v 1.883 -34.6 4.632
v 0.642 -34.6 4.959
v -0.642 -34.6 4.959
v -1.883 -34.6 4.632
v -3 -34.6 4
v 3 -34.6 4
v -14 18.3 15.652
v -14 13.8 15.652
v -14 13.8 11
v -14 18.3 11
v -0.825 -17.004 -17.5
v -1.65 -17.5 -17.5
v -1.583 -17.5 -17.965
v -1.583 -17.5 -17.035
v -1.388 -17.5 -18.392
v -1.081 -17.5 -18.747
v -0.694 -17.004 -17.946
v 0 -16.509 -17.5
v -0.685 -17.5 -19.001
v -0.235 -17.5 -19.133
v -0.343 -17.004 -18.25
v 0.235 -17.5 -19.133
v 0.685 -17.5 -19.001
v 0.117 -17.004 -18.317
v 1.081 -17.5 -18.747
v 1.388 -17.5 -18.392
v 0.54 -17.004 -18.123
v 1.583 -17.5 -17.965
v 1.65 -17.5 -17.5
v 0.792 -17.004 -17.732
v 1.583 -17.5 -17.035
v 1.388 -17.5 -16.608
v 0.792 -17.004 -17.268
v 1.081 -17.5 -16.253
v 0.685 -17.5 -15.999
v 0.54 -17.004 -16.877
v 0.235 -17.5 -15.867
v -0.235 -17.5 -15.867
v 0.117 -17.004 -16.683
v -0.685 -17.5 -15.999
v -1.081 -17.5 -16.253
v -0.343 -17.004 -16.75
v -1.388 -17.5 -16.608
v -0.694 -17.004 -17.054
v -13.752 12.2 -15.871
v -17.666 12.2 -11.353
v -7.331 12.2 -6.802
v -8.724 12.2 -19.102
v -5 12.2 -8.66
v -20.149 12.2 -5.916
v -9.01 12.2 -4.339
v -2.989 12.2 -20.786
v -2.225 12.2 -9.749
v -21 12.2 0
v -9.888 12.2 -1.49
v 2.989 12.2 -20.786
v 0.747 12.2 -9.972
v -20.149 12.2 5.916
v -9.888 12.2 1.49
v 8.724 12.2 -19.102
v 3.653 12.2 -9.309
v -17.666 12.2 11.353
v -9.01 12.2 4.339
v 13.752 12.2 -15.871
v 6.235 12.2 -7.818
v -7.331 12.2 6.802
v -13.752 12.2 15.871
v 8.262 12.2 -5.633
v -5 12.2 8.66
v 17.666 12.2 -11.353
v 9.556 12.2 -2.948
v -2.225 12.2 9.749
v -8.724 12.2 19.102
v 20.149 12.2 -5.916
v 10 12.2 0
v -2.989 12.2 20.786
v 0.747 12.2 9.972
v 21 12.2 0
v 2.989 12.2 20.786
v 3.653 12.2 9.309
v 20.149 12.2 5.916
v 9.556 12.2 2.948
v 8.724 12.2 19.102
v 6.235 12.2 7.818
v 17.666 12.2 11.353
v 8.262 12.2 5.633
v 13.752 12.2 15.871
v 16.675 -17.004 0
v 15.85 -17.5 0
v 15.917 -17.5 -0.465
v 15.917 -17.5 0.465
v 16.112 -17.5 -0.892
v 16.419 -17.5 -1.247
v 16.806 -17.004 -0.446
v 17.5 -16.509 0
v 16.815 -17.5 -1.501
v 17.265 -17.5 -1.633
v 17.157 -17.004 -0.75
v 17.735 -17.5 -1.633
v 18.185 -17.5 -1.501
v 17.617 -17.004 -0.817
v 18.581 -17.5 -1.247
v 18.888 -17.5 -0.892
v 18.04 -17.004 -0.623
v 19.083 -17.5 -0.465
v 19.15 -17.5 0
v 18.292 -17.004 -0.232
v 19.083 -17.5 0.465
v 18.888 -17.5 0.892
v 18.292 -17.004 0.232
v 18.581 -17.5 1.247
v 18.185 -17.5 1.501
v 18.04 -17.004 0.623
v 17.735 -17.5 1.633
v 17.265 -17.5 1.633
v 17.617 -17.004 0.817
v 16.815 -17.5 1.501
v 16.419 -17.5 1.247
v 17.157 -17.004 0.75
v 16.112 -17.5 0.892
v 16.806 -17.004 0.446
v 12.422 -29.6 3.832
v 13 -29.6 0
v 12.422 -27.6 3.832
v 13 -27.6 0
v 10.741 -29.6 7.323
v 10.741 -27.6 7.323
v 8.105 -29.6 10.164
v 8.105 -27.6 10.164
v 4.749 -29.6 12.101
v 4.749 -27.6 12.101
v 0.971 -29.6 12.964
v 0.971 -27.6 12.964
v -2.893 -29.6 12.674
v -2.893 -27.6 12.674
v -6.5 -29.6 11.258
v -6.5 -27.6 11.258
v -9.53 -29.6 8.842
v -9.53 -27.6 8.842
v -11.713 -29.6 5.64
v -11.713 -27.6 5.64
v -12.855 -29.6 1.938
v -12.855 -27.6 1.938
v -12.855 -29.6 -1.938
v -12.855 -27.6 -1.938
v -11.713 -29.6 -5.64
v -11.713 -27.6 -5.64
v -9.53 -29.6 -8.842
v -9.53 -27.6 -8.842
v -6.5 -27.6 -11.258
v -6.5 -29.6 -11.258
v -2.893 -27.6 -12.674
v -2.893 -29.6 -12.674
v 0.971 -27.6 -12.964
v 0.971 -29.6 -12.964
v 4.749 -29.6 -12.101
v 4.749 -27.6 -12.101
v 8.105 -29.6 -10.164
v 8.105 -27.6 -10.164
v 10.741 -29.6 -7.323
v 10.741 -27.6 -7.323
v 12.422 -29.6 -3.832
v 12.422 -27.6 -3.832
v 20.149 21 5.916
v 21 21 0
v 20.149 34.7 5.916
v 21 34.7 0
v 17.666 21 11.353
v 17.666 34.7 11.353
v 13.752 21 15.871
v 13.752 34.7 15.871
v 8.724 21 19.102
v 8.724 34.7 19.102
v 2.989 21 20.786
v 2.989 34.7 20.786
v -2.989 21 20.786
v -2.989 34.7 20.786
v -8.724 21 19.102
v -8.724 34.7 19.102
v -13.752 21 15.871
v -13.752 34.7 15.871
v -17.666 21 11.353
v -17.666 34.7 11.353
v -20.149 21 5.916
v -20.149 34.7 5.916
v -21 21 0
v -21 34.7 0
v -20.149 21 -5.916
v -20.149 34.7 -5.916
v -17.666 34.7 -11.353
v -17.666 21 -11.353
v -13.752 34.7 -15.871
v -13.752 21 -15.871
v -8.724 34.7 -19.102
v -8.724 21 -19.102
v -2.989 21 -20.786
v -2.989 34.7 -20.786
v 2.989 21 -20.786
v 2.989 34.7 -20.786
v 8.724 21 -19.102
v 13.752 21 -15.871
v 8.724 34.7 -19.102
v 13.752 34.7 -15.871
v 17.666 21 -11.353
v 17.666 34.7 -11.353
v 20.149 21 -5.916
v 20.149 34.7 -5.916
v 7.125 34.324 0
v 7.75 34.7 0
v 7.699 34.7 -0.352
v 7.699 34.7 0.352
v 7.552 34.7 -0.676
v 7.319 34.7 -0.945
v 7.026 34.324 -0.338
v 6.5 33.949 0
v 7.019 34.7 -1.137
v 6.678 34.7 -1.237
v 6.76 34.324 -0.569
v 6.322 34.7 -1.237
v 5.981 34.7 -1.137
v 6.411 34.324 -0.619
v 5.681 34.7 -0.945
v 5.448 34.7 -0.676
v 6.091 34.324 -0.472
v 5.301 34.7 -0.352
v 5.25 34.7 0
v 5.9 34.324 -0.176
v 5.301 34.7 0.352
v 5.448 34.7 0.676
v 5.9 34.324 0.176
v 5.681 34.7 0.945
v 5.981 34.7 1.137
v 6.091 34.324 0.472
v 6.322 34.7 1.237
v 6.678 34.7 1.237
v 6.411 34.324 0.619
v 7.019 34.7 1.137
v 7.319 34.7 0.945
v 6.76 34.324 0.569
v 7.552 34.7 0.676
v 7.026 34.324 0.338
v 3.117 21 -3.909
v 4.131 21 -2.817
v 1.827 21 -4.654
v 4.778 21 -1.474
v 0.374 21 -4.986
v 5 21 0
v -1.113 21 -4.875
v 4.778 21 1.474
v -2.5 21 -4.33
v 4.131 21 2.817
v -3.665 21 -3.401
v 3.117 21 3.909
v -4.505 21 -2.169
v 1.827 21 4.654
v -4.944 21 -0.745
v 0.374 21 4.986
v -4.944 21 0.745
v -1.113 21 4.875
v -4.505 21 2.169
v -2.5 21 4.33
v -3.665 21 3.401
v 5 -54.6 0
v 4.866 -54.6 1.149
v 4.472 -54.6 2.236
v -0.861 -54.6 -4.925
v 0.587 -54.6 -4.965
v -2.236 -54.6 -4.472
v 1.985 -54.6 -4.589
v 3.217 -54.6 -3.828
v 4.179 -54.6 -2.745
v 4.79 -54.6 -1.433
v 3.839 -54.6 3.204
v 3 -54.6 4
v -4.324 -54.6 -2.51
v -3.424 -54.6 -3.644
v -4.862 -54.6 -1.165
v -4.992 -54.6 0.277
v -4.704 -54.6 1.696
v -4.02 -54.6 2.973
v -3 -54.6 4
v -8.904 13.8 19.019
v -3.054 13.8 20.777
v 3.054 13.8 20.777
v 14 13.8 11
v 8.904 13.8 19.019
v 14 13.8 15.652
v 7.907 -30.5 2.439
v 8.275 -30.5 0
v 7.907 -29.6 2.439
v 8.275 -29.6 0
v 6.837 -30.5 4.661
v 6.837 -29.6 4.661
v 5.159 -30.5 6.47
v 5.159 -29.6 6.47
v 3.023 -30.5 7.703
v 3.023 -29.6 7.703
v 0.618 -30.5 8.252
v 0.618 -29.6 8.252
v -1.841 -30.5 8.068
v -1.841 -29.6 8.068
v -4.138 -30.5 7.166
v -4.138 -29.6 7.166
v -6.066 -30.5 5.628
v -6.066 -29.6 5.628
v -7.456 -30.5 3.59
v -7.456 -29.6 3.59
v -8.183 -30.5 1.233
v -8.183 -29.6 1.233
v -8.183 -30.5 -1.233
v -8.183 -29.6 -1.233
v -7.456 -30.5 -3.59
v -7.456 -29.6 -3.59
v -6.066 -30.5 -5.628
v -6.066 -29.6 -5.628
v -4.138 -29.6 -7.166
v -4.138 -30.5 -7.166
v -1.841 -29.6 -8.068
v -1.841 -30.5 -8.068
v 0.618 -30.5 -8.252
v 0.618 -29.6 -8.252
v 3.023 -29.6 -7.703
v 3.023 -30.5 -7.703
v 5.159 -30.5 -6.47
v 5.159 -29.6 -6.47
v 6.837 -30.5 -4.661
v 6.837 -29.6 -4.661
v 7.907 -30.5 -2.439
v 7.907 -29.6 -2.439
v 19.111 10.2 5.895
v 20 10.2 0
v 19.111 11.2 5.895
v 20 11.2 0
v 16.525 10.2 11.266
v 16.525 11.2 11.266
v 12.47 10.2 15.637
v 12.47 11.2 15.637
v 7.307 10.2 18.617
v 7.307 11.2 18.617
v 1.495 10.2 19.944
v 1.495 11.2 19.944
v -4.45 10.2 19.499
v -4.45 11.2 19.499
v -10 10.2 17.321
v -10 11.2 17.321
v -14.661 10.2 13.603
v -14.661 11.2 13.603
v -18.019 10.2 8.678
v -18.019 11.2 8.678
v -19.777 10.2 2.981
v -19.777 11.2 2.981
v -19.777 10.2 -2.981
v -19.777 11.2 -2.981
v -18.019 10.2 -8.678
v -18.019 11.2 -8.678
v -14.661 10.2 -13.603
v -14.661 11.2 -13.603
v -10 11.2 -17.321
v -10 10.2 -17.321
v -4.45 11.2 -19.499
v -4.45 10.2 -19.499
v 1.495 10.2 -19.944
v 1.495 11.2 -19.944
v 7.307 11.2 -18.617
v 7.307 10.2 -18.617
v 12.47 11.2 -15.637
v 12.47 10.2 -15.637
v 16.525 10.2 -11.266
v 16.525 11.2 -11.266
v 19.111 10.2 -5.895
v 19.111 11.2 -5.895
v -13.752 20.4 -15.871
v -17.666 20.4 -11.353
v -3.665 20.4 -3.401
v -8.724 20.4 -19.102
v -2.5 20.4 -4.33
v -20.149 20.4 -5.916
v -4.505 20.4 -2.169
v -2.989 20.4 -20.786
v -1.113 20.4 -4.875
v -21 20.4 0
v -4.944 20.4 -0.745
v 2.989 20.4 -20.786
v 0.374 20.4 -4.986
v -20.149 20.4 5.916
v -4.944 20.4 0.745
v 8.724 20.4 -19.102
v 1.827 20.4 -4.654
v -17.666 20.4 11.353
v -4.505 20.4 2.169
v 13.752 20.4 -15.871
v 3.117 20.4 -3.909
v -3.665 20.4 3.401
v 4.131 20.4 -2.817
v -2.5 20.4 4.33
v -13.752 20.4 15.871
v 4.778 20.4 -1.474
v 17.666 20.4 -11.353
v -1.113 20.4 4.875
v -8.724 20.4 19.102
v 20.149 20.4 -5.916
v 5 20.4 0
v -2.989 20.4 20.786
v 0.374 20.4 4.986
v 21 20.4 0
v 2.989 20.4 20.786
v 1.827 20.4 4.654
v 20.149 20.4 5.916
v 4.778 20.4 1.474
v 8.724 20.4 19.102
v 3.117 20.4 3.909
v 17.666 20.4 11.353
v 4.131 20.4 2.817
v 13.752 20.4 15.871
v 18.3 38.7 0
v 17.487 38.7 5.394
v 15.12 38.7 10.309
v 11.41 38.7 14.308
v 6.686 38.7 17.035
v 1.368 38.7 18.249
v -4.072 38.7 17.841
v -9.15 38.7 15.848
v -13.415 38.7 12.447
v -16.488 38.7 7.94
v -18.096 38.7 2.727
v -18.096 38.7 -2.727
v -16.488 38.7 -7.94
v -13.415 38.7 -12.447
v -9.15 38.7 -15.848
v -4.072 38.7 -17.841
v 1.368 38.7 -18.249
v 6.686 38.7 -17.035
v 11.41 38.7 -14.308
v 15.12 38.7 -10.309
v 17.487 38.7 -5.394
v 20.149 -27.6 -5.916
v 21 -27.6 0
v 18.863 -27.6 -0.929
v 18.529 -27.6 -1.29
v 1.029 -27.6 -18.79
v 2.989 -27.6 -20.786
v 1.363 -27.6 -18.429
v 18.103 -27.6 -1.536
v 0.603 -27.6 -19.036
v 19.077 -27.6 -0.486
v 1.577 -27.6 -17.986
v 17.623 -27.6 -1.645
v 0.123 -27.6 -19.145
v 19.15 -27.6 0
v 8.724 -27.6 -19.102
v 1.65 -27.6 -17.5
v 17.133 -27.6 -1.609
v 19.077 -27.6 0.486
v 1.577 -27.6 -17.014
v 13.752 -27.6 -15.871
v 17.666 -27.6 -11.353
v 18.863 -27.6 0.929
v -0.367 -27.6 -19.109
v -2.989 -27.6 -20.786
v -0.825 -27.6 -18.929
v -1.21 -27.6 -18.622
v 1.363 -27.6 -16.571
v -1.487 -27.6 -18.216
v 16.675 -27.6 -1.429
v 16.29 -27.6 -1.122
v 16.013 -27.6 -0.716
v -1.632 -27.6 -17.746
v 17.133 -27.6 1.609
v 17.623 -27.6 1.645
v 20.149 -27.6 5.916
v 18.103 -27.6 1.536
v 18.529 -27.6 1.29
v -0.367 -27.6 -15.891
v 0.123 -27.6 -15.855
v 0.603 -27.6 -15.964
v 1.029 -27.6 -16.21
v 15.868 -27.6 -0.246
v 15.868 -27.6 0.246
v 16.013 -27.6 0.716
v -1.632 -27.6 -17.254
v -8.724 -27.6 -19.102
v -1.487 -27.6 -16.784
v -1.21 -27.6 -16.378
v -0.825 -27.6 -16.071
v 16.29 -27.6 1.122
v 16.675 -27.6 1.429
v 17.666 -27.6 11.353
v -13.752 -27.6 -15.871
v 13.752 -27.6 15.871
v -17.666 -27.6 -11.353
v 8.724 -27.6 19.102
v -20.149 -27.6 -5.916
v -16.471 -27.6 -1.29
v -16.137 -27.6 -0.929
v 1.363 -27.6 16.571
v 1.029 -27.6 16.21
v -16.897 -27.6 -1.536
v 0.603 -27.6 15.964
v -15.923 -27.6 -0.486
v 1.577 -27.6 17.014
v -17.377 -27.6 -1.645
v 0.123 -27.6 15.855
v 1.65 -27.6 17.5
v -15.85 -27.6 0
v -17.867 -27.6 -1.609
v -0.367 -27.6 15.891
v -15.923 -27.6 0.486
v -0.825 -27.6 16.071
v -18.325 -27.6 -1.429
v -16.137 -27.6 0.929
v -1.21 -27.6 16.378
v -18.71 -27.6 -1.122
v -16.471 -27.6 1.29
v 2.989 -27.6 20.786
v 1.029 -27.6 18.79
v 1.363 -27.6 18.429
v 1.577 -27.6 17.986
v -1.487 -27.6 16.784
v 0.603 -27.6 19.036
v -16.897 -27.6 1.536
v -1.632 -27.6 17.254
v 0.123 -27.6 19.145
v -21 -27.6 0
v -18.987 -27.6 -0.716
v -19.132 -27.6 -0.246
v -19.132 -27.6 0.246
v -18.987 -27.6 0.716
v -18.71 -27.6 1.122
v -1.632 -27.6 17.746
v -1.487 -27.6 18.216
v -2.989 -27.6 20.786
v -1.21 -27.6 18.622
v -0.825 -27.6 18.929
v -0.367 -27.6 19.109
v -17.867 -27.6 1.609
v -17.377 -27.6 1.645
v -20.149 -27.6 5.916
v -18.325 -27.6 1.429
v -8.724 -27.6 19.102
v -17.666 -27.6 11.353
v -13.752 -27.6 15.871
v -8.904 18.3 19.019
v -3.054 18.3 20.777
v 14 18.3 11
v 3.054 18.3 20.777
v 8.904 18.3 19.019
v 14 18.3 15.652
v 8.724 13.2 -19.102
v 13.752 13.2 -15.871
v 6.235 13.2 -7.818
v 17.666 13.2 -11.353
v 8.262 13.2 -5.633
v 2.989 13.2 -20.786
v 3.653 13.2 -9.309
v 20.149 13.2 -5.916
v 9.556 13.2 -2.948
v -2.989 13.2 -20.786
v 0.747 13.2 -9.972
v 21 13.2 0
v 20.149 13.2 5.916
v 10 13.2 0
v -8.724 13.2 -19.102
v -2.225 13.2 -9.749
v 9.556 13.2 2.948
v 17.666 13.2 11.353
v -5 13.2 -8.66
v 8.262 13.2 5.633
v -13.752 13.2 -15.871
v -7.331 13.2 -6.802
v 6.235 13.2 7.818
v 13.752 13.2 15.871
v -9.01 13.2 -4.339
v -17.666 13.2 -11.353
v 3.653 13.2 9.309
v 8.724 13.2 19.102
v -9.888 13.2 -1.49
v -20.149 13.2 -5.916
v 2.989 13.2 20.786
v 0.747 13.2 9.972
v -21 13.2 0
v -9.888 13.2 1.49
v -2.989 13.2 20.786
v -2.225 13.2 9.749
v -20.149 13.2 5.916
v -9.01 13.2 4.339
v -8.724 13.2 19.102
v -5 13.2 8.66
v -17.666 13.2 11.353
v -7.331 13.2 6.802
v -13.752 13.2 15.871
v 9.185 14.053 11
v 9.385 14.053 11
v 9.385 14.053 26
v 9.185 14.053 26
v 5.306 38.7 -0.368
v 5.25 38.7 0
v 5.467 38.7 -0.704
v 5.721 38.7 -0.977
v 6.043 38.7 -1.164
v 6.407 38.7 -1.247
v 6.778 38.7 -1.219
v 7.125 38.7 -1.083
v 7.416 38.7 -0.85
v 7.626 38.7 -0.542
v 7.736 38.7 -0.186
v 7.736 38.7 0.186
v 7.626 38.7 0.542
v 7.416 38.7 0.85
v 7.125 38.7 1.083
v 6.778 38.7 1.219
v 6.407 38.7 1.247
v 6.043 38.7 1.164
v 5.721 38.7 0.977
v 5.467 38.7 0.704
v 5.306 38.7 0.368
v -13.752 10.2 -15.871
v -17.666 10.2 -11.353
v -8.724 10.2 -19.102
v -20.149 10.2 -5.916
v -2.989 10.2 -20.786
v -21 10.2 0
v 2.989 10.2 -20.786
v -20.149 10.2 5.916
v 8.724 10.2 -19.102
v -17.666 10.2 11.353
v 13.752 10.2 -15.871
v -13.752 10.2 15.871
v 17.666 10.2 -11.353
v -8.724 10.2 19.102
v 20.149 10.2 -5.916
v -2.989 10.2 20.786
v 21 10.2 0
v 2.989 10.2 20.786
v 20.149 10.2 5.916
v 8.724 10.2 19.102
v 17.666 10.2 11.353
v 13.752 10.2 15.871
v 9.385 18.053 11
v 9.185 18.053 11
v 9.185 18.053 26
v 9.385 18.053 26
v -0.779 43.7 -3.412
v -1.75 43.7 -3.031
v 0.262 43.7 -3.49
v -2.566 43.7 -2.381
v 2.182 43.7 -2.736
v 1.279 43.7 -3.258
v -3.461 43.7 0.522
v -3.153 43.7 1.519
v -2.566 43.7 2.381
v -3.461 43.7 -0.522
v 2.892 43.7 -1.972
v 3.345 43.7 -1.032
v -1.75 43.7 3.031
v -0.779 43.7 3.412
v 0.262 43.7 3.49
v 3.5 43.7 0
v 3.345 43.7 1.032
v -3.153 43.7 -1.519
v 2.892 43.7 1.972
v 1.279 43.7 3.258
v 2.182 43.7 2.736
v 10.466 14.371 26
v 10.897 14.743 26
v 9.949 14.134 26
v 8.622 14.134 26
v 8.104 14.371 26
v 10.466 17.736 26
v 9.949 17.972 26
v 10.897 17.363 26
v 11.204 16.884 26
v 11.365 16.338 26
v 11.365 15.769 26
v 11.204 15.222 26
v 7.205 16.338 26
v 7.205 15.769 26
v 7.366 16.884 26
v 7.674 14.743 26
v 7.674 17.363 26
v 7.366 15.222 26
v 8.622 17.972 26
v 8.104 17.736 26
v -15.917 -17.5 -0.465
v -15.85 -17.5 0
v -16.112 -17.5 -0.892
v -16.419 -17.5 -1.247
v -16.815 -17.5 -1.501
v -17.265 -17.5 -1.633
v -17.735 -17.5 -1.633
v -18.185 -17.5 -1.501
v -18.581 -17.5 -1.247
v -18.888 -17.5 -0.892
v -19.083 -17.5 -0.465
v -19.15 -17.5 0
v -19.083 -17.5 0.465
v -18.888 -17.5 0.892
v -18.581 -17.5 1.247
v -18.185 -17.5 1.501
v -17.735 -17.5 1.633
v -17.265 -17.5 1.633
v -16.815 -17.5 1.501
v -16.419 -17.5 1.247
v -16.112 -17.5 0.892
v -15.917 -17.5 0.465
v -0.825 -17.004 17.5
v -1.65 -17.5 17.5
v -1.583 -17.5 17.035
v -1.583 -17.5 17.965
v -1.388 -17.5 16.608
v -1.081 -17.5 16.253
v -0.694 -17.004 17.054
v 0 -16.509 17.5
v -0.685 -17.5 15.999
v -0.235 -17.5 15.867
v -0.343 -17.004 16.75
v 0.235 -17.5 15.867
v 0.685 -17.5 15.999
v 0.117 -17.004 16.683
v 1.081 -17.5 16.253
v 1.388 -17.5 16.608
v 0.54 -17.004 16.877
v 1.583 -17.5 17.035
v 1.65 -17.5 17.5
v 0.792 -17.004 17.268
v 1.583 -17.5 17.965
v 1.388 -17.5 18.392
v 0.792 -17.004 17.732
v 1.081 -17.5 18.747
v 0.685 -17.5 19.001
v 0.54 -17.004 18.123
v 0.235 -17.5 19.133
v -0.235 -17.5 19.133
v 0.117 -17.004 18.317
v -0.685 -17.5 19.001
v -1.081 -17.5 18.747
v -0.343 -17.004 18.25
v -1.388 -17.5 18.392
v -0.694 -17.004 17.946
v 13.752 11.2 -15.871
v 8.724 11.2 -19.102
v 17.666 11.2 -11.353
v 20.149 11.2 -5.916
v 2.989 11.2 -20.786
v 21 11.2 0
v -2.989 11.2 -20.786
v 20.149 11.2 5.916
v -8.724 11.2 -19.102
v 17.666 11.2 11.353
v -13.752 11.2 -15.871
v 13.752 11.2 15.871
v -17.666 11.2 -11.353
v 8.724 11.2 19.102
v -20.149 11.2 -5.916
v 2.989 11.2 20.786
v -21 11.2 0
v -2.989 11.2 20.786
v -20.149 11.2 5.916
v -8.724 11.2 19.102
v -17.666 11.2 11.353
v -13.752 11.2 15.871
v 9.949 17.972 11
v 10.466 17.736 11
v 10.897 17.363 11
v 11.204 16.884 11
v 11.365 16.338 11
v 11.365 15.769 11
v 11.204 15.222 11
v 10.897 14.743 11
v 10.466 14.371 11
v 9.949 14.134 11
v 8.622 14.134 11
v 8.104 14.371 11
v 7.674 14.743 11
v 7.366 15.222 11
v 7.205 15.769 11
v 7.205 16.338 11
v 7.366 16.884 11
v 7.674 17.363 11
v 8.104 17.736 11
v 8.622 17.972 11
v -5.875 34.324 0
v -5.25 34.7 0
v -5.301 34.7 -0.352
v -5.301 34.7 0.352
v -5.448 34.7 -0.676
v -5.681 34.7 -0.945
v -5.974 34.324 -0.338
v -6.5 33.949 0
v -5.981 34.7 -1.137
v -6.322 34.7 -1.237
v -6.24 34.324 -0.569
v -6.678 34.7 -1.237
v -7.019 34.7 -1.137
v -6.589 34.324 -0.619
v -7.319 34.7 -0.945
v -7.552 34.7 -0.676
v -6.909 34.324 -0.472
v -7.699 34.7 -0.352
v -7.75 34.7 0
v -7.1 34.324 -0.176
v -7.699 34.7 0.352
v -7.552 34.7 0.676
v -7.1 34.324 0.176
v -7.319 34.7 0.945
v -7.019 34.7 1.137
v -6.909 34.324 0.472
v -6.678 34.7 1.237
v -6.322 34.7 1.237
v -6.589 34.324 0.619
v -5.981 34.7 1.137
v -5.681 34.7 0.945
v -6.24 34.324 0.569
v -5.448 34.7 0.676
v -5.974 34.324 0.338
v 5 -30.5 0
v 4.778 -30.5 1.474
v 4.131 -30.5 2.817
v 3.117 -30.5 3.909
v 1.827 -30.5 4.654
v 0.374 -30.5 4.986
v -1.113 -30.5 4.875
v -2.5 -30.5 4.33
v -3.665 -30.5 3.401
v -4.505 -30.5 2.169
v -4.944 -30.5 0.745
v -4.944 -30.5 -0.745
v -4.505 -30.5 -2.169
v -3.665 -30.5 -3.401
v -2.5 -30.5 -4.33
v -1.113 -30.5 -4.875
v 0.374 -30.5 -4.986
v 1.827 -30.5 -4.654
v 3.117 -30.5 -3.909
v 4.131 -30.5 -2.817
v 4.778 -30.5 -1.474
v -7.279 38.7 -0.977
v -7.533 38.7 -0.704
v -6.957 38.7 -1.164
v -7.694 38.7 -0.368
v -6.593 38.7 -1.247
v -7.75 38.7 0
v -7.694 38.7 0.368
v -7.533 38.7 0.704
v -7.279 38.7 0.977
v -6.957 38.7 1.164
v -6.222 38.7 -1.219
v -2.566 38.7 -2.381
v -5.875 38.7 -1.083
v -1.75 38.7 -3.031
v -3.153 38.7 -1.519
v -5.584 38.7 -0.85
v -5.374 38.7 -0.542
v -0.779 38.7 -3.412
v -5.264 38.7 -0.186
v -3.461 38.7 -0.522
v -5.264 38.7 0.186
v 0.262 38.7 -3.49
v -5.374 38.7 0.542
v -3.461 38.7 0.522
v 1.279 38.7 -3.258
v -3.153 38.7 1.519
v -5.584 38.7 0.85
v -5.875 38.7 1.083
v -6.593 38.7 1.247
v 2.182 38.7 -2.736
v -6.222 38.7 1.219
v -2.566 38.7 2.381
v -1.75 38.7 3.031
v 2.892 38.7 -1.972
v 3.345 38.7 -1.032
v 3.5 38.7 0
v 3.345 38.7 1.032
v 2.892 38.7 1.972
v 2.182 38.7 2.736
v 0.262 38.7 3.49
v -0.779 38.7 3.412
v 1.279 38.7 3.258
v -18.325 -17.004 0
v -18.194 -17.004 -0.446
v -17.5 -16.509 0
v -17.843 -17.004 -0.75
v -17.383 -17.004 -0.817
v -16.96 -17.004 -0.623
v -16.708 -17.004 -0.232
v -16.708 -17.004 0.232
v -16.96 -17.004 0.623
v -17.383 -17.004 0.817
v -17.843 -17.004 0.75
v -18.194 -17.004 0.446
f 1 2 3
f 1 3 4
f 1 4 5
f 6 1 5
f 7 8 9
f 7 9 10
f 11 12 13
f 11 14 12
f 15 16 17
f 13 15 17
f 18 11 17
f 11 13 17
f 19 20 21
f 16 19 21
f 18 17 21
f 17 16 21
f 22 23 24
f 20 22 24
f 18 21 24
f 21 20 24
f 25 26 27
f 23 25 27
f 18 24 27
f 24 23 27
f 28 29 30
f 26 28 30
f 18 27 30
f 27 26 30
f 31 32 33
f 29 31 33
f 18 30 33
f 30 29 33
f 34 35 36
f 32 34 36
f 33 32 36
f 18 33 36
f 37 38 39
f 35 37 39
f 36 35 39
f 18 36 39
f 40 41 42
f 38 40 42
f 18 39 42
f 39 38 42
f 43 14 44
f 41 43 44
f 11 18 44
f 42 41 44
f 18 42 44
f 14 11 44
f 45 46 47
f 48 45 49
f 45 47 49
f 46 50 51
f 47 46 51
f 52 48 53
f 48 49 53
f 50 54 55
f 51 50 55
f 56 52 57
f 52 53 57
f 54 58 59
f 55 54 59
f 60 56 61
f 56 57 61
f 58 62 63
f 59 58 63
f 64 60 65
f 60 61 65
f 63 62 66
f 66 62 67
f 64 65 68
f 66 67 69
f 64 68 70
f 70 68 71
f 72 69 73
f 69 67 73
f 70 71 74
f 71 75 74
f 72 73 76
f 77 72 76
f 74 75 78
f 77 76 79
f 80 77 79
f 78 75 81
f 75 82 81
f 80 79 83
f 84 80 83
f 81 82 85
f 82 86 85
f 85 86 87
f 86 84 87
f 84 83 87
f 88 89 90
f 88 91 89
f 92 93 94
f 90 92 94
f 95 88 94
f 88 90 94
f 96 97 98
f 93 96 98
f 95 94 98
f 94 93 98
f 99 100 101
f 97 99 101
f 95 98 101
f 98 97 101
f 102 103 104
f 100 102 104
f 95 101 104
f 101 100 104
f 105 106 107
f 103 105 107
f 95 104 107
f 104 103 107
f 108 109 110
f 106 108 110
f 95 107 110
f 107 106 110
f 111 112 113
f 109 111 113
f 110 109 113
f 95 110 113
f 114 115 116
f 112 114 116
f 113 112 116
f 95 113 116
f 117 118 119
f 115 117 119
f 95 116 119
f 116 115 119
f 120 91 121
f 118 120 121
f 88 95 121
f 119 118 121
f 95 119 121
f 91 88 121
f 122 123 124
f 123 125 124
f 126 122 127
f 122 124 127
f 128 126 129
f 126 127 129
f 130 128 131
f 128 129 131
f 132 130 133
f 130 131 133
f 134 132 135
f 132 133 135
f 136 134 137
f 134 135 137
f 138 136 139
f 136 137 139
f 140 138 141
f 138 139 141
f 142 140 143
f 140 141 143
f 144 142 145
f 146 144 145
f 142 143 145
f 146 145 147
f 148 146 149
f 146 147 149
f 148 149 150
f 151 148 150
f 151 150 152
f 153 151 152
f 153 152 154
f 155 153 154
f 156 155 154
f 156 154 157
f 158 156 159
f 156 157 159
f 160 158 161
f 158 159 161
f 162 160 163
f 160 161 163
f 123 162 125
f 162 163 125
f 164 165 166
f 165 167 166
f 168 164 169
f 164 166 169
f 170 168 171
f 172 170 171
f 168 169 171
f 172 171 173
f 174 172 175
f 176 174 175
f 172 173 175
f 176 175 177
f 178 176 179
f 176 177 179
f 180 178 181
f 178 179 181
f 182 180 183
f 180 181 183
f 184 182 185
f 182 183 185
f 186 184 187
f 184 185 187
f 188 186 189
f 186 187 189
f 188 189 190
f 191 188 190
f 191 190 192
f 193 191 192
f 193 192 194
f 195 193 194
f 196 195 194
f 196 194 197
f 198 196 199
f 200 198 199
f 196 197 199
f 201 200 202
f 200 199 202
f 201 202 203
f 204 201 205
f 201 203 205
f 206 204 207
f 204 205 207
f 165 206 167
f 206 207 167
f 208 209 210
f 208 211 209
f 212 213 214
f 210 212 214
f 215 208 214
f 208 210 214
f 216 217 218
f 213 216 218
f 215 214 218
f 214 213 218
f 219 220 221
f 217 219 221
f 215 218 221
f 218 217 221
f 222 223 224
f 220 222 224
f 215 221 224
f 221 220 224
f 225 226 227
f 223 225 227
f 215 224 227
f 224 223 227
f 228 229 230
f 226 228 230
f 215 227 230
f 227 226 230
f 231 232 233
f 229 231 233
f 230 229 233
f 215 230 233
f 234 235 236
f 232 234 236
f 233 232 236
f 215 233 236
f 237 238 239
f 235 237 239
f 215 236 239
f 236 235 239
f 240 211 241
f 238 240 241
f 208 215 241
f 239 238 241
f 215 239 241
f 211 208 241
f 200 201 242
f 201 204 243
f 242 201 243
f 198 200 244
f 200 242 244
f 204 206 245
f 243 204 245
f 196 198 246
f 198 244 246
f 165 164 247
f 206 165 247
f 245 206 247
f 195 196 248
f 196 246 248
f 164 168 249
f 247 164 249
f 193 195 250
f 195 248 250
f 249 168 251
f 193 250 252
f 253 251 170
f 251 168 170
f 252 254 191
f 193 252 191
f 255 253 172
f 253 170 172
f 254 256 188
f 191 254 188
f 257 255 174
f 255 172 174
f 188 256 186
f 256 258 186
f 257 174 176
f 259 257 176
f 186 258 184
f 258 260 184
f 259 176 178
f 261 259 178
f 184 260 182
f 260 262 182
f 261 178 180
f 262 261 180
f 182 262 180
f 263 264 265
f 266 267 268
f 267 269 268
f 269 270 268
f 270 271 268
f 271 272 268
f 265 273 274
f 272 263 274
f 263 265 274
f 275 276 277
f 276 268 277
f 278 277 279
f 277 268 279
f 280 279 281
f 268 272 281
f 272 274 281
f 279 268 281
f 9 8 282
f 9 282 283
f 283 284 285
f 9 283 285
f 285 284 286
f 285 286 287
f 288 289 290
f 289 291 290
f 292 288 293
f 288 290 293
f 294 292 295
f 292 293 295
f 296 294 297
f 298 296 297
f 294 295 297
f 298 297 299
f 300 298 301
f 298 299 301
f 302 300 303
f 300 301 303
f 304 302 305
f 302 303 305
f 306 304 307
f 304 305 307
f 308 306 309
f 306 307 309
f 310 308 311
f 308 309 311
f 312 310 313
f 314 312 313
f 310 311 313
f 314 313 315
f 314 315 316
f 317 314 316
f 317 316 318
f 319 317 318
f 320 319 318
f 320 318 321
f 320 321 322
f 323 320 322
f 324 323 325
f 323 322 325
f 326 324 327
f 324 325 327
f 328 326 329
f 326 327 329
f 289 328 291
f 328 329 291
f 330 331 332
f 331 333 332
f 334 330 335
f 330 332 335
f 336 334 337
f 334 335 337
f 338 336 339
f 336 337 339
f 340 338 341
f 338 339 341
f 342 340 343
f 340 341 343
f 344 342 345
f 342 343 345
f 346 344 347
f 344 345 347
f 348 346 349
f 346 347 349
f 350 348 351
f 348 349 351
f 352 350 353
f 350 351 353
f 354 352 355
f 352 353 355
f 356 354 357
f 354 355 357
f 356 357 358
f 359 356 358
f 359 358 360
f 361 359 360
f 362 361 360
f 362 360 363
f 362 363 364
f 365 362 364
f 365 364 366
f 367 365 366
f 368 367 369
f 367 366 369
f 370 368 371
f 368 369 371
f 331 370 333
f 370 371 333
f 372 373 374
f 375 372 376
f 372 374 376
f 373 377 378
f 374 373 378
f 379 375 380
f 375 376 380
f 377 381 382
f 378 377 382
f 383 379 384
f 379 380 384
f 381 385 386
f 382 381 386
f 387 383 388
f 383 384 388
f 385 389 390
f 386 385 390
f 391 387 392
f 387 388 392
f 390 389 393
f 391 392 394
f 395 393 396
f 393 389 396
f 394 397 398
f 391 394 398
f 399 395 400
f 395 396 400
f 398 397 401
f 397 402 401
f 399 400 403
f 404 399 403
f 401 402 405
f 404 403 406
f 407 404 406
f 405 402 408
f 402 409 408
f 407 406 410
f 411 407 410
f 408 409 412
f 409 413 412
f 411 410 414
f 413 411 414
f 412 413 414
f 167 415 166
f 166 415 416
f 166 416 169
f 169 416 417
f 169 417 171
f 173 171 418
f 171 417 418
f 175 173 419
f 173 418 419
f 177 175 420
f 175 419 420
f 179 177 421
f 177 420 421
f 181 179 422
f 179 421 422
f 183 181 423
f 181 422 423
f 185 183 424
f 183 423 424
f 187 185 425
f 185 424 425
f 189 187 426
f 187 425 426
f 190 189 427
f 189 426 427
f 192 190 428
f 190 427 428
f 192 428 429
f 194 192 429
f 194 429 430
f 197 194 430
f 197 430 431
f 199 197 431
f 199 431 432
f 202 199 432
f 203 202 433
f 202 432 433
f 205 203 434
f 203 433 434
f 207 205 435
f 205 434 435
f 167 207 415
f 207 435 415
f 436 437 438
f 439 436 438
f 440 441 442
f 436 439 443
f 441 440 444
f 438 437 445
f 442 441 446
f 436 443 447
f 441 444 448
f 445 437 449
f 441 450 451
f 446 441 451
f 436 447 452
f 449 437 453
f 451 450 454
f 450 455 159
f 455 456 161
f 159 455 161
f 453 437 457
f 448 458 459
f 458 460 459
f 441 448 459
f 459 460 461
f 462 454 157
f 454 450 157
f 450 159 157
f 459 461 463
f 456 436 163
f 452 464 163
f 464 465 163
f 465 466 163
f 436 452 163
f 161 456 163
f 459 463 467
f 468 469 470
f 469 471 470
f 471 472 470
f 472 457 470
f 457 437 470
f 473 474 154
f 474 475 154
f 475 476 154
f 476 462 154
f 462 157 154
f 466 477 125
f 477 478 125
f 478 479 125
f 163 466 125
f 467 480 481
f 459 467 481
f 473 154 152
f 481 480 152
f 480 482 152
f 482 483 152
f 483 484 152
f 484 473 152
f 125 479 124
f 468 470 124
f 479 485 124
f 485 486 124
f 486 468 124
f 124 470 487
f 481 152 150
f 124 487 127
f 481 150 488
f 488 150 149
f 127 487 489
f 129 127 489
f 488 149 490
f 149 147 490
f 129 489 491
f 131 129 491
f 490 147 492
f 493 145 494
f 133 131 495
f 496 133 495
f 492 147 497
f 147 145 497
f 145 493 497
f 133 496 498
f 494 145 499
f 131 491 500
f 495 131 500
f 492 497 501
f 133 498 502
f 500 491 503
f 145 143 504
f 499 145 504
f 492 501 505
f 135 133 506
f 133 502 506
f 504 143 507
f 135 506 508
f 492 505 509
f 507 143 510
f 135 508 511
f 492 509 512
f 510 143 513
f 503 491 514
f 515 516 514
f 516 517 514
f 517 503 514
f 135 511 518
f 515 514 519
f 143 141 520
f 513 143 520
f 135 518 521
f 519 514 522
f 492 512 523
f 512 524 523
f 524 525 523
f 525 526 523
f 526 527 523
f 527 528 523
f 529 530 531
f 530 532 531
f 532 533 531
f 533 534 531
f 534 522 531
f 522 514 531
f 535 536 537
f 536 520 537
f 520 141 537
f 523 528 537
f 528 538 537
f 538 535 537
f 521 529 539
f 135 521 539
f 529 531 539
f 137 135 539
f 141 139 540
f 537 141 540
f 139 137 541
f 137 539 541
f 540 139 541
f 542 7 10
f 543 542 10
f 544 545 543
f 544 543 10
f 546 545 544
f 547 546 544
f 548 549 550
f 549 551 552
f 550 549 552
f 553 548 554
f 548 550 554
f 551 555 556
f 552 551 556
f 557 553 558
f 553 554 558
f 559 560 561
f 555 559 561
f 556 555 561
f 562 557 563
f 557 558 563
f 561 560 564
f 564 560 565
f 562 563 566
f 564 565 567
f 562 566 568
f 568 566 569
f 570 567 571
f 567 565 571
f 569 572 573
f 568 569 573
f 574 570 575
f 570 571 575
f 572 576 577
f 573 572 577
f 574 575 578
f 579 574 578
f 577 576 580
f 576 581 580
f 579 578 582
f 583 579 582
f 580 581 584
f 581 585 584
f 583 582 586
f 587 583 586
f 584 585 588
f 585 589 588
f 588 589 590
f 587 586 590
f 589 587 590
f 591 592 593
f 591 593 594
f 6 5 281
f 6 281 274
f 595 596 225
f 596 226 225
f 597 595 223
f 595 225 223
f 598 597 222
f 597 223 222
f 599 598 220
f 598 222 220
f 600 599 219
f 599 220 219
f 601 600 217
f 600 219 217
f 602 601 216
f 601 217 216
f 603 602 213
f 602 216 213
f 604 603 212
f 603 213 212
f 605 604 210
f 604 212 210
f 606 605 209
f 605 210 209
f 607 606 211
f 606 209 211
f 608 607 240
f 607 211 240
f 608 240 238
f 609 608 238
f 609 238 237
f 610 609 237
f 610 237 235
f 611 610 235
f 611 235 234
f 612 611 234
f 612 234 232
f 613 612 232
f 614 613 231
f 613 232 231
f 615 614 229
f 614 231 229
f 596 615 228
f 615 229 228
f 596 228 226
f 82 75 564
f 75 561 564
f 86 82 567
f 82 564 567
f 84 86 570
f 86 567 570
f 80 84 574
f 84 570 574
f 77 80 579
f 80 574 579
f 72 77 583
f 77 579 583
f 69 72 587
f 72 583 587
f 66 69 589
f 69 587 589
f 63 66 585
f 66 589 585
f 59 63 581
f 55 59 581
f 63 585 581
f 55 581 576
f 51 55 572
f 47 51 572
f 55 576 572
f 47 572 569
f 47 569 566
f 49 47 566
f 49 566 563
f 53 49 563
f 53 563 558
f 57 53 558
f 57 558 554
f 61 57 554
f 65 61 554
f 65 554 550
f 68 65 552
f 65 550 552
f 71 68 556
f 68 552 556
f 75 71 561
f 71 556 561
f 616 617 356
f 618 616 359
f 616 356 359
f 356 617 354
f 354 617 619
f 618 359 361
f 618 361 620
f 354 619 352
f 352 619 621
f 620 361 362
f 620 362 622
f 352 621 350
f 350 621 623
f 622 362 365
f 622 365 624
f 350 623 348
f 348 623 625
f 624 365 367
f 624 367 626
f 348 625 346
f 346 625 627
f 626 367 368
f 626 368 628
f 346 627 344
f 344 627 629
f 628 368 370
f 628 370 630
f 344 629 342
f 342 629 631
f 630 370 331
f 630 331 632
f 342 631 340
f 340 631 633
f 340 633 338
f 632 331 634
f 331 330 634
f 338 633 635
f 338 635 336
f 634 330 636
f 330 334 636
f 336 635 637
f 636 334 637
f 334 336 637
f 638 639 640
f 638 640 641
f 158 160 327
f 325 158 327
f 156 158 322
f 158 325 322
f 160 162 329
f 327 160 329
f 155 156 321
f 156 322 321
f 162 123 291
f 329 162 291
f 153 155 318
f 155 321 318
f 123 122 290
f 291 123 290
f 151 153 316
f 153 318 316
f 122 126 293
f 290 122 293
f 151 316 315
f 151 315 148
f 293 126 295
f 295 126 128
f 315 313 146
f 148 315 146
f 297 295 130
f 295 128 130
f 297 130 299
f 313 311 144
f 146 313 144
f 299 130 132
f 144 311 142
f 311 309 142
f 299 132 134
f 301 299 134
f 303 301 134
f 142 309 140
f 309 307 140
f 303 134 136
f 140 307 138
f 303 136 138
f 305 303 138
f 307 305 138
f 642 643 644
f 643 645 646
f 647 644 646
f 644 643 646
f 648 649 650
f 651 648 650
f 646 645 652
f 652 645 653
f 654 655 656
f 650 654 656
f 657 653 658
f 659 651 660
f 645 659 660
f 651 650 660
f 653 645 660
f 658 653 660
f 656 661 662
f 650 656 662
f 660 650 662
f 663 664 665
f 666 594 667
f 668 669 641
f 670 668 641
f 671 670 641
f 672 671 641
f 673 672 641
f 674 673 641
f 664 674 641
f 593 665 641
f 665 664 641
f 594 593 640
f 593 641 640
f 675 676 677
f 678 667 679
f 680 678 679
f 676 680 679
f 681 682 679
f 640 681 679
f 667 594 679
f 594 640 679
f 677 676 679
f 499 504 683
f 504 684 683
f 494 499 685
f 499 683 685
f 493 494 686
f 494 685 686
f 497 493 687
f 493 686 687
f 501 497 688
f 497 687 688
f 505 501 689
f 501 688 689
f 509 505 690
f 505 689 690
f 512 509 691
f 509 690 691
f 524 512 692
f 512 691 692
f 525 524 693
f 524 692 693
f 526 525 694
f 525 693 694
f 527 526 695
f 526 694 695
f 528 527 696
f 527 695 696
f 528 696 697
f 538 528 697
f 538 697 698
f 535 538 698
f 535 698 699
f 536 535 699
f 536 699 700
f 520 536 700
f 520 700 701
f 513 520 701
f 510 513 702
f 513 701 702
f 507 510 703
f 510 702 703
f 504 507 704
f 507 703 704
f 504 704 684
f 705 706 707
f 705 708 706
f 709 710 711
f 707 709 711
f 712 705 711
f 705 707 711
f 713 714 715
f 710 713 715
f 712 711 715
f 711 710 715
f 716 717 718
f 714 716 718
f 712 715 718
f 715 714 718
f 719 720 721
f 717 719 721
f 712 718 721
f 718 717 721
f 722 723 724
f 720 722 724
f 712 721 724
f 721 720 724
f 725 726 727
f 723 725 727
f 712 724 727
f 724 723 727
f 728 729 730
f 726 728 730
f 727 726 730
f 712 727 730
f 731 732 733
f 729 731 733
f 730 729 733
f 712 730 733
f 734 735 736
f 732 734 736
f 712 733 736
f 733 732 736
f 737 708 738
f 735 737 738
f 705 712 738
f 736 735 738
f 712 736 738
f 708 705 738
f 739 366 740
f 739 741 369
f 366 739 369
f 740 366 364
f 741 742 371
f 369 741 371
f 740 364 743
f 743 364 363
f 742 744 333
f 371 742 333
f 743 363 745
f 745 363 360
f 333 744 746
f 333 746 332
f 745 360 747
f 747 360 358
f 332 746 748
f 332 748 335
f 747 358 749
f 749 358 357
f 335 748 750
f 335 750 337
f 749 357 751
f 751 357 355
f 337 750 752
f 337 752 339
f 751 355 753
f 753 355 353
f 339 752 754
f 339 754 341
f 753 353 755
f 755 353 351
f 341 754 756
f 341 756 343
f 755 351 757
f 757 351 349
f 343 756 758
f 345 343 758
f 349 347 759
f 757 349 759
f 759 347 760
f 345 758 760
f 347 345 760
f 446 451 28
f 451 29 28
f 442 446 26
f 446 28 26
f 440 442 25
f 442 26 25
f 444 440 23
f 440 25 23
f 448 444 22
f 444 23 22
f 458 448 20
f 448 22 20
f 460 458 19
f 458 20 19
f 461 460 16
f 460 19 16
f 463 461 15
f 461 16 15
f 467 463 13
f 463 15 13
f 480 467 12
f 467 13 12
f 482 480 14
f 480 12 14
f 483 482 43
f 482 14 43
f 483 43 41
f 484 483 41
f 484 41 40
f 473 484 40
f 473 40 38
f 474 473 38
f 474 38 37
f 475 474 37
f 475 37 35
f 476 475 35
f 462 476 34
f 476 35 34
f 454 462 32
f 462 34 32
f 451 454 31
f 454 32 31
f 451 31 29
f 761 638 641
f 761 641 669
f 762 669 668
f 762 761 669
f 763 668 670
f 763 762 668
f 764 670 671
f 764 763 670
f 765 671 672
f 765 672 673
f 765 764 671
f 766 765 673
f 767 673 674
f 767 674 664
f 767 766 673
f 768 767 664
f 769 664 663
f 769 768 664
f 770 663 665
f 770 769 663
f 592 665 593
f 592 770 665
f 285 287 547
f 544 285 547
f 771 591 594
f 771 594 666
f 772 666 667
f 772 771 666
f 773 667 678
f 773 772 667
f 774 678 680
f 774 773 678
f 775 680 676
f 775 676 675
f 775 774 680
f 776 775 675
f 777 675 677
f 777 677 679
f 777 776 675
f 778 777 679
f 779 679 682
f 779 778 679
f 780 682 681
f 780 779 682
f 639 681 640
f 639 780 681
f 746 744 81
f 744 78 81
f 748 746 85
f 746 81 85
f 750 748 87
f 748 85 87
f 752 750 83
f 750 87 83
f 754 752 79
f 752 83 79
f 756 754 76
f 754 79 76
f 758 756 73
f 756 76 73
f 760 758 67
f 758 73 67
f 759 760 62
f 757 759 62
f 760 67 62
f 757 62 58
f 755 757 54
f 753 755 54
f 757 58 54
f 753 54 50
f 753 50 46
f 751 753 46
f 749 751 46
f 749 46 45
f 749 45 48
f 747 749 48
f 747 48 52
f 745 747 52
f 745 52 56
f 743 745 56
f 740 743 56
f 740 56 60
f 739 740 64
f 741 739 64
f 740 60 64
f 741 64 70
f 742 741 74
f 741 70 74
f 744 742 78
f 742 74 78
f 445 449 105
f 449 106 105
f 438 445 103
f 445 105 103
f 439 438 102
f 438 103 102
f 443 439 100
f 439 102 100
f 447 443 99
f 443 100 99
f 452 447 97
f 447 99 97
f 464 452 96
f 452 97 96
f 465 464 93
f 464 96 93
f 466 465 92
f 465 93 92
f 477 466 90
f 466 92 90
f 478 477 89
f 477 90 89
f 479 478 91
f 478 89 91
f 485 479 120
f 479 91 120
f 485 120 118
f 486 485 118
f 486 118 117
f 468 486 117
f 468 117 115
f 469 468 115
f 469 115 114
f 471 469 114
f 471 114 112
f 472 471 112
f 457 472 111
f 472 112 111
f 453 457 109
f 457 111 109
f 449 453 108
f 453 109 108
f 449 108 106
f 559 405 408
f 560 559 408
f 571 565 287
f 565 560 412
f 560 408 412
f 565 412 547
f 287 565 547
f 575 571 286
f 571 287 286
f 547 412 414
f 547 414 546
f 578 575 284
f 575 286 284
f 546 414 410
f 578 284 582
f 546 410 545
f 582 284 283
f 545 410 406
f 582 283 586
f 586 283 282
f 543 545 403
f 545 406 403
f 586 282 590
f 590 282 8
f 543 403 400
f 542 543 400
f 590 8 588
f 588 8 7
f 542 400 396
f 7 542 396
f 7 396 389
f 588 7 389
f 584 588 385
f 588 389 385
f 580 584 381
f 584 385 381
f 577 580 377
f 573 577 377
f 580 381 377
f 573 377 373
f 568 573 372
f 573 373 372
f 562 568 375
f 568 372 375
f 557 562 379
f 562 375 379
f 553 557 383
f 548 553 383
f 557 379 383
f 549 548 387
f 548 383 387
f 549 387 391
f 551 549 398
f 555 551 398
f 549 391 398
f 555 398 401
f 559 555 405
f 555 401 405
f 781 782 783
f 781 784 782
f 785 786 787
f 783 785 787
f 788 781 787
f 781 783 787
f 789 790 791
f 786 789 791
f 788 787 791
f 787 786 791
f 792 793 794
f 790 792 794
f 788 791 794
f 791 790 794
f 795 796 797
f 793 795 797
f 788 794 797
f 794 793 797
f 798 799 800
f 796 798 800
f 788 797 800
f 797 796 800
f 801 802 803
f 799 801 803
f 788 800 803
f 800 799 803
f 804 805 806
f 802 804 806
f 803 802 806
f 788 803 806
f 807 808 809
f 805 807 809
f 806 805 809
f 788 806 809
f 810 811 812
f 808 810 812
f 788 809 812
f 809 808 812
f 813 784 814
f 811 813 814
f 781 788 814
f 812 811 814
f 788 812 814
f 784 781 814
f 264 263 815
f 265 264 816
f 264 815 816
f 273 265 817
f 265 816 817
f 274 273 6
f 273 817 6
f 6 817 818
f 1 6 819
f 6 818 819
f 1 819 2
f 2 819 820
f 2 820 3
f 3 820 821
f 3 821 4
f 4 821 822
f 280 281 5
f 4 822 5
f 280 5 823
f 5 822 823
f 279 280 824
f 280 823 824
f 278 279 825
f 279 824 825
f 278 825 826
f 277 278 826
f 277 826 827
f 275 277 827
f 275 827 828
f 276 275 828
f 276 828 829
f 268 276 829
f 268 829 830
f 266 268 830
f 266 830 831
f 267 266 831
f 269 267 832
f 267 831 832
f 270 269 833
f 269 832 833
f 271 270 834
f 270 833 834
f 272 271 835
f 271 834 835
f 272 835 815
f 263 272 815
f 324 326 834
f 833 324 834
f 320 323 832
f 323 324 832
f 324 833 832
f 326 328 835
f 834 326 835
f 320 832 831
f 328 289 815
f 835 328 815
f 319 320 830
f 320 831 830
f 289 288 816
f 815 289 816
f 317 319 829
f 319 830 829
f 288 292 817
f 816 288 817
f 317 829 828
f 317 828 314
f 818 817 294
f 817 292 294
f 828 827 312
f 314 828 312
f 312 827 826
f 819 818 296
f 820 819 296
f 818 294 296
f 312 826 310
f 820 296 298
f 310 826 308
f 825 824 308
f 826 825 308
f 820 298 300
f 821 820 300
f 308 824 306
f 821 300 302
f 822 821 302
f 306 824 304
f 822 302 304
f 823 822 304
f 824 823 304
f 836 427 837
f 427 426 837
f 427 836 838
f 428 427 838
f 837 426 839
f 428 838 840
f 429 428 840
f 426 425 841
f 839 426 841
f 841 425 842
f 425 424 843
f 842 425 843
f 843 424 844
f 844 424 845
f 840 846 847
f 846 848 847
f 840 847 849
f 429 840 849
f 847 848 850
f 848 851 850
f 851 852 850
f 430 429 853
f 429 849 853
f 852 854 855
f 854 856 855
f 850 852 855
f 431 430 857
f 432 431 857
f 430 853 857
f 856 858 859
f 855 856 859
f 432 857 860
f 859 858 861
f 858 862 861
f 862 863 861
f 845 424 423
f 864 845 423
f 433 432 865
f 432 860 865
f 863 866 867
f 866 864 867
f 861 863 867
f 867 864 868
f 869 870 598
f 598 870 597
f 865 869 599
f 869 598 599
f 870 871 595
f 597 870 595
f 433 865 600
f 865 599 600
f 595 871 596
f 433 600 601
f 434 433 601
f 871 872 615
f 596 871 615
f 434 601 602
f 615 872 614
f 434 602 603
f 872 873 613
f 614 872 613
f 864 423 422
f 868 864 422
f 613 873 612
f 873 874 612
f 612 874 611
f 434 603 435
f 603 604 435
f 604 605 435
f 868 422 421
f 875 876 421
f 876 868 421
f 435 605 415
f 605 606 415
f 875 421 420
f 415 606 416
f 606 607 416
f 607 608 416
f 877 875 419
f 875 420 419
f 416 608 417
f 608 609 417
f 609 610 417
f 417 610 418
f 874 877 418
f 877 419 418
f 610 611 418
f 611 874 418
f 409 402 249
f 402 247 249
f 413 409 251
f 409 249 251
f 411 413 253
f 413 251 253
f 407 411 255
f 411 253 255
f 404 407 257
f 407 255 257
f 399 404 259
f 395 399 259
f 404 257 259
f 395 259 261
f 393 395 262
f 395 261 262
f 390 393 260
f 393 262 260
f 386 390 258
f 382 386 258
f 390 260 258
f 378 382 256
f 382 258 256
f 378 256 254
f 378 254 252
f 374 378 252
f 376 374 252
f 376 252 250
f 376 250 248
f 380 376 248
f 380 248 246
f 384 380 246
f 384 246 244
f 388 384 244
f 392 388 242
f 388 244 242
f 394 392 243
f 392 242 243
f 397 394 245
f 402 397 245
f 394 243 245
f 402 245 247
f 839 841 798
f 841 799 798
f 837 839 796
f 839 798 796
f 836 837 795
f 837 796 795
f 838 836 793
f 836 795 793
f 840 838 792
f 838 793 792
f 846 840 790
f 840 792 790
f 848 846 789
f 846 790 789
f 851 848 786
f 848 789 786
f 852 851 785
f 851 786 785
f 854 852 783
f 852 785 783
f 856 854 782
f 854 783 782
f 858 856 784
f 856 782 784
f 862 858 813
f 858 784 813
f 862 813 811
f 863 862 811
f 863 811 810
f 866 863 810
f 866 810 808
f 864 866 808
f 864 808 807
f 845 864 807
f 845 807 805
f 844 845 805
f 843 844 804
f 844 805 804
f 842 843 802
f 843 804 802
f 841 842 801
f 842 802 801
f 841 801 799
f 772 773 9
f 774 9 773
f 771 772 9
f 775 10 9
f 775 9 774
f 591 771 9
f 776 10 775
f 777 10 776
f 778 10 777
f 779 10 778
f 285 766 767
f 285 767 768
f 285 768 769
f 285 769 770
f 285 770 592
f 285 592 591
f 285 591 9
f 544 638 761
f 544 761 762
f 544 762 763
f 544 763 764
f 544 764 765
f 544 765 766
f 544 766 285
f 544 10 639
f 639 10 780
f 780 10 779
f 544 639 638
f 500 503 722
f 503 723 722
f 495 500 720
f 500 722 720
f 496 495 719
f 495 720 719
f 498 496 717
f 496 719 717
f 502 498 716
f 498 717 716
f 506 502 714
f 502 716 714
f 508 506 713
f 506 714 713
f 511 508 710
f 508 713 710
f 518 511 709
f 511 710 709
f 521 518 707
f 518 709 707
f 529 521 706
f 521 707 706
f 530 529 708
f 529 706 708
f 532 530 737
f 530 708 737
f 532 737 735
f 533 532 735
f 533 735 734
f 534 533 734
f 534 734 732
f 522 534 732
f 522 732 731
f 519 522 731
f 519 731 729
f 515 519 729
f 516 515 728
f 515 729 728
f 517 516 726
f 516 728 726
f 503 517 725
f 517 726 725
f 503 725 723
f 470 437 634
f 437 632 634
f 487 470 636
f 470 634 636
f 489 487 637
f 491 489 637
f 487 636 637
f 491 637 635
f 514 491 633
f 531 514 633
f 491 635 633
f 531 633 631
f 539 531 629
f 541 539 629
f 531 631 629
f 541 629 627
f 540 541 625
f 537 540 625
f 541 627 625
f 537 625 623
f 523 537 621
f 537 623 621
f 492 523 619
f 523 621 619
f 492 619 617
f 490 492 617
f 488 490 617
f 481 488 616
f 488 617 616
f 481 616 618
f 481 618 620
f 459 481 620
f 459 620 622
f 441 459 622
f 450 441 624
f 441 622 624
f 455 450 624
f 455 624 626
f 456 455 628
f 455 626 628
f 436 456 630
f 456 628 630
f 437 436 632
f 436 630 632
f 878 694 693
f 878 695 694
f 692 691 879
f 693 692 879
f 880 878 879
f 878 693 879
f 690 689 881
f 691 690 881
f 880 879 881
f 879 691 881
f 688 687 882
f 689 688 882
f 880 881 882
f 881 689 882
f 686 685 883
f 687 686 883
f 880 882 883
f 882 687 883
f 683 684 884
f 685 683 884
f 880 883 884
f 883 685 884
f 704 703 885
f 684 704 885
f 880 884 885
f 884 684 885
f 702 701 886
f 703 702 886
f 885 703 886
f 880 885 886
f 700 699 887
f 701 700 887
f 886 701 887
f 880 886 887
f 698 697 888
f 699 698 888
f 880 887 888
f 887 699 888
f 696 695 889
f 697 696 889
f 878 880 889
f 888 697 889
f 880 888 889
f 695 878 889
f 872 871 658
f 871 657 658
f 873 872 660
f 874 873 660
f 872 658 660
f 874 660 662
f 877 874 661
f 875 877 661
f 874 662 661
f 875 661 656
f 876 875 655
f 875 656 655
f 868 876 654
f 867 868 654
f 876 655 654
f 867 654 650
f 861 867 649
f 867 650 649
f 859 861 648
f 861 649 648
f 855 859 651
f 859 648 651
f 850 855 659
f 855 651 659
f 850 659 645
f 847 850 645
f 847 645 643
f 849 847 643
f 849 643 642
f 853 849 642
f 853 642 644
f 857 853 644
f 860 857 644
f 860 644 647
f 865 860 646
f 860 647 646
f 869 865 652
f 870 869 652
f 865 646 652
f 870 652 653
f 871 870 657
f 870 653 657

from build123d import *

# Parameters (mm, degrees)
SKETCH_2_W             = 28
SKETCH_2_H             = 4.5
CUT_EXTRUDE_1_DEPTH    = 10
EXTRUDE_1_DEPTH        = 15
HOLE_WIZARD_M3_1_D     = 2.5
HOLE_WIZARD_M3_1_DEPTH = 4
HOLE_WIZARD_M3_1_TIP   = 0.751075774
CUT_EXTRUDE_2_DEPTH    = 20
HOLE_WIZARD_M4_1_D     = 3.3
HOLE_WIZARD_M4_1_DEPTH = 10.1
HOLE_WIZARD_M4_1_TIP   = 0.991420021


with BuildPart() as part:
    # 草图1 → 旋转1 (revolve)
    with BuildSketch(Plane.XY):
        Polygon((0, 0), (4.1, 0), (4.1, 6.7), (13.4, 6.7), (13.4, 8.7), (21, 8.7), (21, 10.2), (20, 10.2), (20, 11.2), (21, 11.2), (21, 12.2), (10, 12.2), (10, 13.2), (21, 13.2), (21, 20.4), (5, 20.4), (5, 21), (21, 21), (21, 34.7), (18.3, 38.7), (3.5, 38.7), (3.5, 43.7), (0, 43.7), align=None)
    revolve(axis=Axis((0, 43.7, 0), (0, -1, 0)))

    # 草图2 → 切除-拉伸1 (cut)
    with BuildSketch(Plane.XY.offset(21)):
        with Locations((0, 16.05)):
            Rectangle(SKETCH_2_W, SKETCH_2_H)
    extrude(amount=-CUT_EXTRUDE_1_DEPTH, mode=Mode.SUBTRACT)

    # 草图3 → 凸台-拉伸1 (add)
    with BuildSketch(Plane.XY.offset(11)):
        with BuildLine():
            Line((9.185056323, 18.053194417), (9.385056323, 18.053194417))
            ThreePointArc((9.385056323, 18.053194417), (11.385056323, 16.053194417), (9.385056323, 14.053194417))
            Line((9.385056323, 14.053194417), (9.185056323, 14.053194417))
            ThreePointArc((9.185056323, 14.053194417), (7.185056323, 16.053194417), (9.185056323, 18.053194417))
        make_face()
    extrude(amount=EXTRUDE_1_DEPTH)

    # M3 螺纹孔1
    with Locations(Plane(origin=(0, 38.7, 0), x_dir=(1, 0, 0), z_dir=(0, 1, 0))):
        with Locations((-6.5, 0), (6.5, 0)):
            Hole(HOLE_WIZARD_M3_1_D / 2, depth=HOLE_WIZARD_M3_1_DEPTH)
            with Locations((0, 0, -(HOLE_WIZARD_M3_1_DEPTH + HOLE_WIZARD_M3_1_TIP / 2))):  # 118° drill point
                Cone(0, HOLE_WIZARD_M3_1_D / 2, HOLE_WIZARD_M3_1_TIP, mode=Mode.SUBTRACT)

    # 草图7 → 旋转2 (revolve)
    with BuildSketch(Plane.XY):
        Polygon((0, -54.6), (5, -54.6), (5, -30.5), (8.275, -30.5), (8.275, -29.6), (13, -29.6), (13, -27.6), (21, -27.6), (21, 8.7), (0, 8.7), align=None)
    revolve(axis=Axis((0, 8.7, 0), (0, -1, 0)))

    # 草图8 → 切除-拉伸2 (cut)
    with BuildSketch(Plane.XZ.offset(54.6)):
        with BuildLine():
            Line((-3, 4), (3, 4))
            ThreePointArc((3, 4), (0, 5), (-3, 4))
        make_face()
    extrude(amount=-CUT_EXTRUDE_2_DEPTH, mode=Mode.SUBTRACT)

    # M4 螺纹孔1
    with Locations(Plane(origin=(0, -27.6, 0), x_dir=(-1, 0, 0), z_dir=(0, -1, 0))):
        with Locations((0, -17.5), (-17.5, 0), (0, 17.5), (17.5, 0)):
            Hole(HOLE_WIZARD_M4_1_D / 2, depth=HOLE_WIZARD_M4_1_DEPTH)
            with Locations((0, 0, -(HOLE_WIZARD_M4_1_DEPTH + HOLE_WIZARD_M4_1_TIP / 2))):  # 118° drill point
                Cone(0, HOLE_WIZARD_M4_1_D / 2, HOLE_WIZARD_M4_1_TIP, mode=Mode.SUBTRACT)


solid = part.part
